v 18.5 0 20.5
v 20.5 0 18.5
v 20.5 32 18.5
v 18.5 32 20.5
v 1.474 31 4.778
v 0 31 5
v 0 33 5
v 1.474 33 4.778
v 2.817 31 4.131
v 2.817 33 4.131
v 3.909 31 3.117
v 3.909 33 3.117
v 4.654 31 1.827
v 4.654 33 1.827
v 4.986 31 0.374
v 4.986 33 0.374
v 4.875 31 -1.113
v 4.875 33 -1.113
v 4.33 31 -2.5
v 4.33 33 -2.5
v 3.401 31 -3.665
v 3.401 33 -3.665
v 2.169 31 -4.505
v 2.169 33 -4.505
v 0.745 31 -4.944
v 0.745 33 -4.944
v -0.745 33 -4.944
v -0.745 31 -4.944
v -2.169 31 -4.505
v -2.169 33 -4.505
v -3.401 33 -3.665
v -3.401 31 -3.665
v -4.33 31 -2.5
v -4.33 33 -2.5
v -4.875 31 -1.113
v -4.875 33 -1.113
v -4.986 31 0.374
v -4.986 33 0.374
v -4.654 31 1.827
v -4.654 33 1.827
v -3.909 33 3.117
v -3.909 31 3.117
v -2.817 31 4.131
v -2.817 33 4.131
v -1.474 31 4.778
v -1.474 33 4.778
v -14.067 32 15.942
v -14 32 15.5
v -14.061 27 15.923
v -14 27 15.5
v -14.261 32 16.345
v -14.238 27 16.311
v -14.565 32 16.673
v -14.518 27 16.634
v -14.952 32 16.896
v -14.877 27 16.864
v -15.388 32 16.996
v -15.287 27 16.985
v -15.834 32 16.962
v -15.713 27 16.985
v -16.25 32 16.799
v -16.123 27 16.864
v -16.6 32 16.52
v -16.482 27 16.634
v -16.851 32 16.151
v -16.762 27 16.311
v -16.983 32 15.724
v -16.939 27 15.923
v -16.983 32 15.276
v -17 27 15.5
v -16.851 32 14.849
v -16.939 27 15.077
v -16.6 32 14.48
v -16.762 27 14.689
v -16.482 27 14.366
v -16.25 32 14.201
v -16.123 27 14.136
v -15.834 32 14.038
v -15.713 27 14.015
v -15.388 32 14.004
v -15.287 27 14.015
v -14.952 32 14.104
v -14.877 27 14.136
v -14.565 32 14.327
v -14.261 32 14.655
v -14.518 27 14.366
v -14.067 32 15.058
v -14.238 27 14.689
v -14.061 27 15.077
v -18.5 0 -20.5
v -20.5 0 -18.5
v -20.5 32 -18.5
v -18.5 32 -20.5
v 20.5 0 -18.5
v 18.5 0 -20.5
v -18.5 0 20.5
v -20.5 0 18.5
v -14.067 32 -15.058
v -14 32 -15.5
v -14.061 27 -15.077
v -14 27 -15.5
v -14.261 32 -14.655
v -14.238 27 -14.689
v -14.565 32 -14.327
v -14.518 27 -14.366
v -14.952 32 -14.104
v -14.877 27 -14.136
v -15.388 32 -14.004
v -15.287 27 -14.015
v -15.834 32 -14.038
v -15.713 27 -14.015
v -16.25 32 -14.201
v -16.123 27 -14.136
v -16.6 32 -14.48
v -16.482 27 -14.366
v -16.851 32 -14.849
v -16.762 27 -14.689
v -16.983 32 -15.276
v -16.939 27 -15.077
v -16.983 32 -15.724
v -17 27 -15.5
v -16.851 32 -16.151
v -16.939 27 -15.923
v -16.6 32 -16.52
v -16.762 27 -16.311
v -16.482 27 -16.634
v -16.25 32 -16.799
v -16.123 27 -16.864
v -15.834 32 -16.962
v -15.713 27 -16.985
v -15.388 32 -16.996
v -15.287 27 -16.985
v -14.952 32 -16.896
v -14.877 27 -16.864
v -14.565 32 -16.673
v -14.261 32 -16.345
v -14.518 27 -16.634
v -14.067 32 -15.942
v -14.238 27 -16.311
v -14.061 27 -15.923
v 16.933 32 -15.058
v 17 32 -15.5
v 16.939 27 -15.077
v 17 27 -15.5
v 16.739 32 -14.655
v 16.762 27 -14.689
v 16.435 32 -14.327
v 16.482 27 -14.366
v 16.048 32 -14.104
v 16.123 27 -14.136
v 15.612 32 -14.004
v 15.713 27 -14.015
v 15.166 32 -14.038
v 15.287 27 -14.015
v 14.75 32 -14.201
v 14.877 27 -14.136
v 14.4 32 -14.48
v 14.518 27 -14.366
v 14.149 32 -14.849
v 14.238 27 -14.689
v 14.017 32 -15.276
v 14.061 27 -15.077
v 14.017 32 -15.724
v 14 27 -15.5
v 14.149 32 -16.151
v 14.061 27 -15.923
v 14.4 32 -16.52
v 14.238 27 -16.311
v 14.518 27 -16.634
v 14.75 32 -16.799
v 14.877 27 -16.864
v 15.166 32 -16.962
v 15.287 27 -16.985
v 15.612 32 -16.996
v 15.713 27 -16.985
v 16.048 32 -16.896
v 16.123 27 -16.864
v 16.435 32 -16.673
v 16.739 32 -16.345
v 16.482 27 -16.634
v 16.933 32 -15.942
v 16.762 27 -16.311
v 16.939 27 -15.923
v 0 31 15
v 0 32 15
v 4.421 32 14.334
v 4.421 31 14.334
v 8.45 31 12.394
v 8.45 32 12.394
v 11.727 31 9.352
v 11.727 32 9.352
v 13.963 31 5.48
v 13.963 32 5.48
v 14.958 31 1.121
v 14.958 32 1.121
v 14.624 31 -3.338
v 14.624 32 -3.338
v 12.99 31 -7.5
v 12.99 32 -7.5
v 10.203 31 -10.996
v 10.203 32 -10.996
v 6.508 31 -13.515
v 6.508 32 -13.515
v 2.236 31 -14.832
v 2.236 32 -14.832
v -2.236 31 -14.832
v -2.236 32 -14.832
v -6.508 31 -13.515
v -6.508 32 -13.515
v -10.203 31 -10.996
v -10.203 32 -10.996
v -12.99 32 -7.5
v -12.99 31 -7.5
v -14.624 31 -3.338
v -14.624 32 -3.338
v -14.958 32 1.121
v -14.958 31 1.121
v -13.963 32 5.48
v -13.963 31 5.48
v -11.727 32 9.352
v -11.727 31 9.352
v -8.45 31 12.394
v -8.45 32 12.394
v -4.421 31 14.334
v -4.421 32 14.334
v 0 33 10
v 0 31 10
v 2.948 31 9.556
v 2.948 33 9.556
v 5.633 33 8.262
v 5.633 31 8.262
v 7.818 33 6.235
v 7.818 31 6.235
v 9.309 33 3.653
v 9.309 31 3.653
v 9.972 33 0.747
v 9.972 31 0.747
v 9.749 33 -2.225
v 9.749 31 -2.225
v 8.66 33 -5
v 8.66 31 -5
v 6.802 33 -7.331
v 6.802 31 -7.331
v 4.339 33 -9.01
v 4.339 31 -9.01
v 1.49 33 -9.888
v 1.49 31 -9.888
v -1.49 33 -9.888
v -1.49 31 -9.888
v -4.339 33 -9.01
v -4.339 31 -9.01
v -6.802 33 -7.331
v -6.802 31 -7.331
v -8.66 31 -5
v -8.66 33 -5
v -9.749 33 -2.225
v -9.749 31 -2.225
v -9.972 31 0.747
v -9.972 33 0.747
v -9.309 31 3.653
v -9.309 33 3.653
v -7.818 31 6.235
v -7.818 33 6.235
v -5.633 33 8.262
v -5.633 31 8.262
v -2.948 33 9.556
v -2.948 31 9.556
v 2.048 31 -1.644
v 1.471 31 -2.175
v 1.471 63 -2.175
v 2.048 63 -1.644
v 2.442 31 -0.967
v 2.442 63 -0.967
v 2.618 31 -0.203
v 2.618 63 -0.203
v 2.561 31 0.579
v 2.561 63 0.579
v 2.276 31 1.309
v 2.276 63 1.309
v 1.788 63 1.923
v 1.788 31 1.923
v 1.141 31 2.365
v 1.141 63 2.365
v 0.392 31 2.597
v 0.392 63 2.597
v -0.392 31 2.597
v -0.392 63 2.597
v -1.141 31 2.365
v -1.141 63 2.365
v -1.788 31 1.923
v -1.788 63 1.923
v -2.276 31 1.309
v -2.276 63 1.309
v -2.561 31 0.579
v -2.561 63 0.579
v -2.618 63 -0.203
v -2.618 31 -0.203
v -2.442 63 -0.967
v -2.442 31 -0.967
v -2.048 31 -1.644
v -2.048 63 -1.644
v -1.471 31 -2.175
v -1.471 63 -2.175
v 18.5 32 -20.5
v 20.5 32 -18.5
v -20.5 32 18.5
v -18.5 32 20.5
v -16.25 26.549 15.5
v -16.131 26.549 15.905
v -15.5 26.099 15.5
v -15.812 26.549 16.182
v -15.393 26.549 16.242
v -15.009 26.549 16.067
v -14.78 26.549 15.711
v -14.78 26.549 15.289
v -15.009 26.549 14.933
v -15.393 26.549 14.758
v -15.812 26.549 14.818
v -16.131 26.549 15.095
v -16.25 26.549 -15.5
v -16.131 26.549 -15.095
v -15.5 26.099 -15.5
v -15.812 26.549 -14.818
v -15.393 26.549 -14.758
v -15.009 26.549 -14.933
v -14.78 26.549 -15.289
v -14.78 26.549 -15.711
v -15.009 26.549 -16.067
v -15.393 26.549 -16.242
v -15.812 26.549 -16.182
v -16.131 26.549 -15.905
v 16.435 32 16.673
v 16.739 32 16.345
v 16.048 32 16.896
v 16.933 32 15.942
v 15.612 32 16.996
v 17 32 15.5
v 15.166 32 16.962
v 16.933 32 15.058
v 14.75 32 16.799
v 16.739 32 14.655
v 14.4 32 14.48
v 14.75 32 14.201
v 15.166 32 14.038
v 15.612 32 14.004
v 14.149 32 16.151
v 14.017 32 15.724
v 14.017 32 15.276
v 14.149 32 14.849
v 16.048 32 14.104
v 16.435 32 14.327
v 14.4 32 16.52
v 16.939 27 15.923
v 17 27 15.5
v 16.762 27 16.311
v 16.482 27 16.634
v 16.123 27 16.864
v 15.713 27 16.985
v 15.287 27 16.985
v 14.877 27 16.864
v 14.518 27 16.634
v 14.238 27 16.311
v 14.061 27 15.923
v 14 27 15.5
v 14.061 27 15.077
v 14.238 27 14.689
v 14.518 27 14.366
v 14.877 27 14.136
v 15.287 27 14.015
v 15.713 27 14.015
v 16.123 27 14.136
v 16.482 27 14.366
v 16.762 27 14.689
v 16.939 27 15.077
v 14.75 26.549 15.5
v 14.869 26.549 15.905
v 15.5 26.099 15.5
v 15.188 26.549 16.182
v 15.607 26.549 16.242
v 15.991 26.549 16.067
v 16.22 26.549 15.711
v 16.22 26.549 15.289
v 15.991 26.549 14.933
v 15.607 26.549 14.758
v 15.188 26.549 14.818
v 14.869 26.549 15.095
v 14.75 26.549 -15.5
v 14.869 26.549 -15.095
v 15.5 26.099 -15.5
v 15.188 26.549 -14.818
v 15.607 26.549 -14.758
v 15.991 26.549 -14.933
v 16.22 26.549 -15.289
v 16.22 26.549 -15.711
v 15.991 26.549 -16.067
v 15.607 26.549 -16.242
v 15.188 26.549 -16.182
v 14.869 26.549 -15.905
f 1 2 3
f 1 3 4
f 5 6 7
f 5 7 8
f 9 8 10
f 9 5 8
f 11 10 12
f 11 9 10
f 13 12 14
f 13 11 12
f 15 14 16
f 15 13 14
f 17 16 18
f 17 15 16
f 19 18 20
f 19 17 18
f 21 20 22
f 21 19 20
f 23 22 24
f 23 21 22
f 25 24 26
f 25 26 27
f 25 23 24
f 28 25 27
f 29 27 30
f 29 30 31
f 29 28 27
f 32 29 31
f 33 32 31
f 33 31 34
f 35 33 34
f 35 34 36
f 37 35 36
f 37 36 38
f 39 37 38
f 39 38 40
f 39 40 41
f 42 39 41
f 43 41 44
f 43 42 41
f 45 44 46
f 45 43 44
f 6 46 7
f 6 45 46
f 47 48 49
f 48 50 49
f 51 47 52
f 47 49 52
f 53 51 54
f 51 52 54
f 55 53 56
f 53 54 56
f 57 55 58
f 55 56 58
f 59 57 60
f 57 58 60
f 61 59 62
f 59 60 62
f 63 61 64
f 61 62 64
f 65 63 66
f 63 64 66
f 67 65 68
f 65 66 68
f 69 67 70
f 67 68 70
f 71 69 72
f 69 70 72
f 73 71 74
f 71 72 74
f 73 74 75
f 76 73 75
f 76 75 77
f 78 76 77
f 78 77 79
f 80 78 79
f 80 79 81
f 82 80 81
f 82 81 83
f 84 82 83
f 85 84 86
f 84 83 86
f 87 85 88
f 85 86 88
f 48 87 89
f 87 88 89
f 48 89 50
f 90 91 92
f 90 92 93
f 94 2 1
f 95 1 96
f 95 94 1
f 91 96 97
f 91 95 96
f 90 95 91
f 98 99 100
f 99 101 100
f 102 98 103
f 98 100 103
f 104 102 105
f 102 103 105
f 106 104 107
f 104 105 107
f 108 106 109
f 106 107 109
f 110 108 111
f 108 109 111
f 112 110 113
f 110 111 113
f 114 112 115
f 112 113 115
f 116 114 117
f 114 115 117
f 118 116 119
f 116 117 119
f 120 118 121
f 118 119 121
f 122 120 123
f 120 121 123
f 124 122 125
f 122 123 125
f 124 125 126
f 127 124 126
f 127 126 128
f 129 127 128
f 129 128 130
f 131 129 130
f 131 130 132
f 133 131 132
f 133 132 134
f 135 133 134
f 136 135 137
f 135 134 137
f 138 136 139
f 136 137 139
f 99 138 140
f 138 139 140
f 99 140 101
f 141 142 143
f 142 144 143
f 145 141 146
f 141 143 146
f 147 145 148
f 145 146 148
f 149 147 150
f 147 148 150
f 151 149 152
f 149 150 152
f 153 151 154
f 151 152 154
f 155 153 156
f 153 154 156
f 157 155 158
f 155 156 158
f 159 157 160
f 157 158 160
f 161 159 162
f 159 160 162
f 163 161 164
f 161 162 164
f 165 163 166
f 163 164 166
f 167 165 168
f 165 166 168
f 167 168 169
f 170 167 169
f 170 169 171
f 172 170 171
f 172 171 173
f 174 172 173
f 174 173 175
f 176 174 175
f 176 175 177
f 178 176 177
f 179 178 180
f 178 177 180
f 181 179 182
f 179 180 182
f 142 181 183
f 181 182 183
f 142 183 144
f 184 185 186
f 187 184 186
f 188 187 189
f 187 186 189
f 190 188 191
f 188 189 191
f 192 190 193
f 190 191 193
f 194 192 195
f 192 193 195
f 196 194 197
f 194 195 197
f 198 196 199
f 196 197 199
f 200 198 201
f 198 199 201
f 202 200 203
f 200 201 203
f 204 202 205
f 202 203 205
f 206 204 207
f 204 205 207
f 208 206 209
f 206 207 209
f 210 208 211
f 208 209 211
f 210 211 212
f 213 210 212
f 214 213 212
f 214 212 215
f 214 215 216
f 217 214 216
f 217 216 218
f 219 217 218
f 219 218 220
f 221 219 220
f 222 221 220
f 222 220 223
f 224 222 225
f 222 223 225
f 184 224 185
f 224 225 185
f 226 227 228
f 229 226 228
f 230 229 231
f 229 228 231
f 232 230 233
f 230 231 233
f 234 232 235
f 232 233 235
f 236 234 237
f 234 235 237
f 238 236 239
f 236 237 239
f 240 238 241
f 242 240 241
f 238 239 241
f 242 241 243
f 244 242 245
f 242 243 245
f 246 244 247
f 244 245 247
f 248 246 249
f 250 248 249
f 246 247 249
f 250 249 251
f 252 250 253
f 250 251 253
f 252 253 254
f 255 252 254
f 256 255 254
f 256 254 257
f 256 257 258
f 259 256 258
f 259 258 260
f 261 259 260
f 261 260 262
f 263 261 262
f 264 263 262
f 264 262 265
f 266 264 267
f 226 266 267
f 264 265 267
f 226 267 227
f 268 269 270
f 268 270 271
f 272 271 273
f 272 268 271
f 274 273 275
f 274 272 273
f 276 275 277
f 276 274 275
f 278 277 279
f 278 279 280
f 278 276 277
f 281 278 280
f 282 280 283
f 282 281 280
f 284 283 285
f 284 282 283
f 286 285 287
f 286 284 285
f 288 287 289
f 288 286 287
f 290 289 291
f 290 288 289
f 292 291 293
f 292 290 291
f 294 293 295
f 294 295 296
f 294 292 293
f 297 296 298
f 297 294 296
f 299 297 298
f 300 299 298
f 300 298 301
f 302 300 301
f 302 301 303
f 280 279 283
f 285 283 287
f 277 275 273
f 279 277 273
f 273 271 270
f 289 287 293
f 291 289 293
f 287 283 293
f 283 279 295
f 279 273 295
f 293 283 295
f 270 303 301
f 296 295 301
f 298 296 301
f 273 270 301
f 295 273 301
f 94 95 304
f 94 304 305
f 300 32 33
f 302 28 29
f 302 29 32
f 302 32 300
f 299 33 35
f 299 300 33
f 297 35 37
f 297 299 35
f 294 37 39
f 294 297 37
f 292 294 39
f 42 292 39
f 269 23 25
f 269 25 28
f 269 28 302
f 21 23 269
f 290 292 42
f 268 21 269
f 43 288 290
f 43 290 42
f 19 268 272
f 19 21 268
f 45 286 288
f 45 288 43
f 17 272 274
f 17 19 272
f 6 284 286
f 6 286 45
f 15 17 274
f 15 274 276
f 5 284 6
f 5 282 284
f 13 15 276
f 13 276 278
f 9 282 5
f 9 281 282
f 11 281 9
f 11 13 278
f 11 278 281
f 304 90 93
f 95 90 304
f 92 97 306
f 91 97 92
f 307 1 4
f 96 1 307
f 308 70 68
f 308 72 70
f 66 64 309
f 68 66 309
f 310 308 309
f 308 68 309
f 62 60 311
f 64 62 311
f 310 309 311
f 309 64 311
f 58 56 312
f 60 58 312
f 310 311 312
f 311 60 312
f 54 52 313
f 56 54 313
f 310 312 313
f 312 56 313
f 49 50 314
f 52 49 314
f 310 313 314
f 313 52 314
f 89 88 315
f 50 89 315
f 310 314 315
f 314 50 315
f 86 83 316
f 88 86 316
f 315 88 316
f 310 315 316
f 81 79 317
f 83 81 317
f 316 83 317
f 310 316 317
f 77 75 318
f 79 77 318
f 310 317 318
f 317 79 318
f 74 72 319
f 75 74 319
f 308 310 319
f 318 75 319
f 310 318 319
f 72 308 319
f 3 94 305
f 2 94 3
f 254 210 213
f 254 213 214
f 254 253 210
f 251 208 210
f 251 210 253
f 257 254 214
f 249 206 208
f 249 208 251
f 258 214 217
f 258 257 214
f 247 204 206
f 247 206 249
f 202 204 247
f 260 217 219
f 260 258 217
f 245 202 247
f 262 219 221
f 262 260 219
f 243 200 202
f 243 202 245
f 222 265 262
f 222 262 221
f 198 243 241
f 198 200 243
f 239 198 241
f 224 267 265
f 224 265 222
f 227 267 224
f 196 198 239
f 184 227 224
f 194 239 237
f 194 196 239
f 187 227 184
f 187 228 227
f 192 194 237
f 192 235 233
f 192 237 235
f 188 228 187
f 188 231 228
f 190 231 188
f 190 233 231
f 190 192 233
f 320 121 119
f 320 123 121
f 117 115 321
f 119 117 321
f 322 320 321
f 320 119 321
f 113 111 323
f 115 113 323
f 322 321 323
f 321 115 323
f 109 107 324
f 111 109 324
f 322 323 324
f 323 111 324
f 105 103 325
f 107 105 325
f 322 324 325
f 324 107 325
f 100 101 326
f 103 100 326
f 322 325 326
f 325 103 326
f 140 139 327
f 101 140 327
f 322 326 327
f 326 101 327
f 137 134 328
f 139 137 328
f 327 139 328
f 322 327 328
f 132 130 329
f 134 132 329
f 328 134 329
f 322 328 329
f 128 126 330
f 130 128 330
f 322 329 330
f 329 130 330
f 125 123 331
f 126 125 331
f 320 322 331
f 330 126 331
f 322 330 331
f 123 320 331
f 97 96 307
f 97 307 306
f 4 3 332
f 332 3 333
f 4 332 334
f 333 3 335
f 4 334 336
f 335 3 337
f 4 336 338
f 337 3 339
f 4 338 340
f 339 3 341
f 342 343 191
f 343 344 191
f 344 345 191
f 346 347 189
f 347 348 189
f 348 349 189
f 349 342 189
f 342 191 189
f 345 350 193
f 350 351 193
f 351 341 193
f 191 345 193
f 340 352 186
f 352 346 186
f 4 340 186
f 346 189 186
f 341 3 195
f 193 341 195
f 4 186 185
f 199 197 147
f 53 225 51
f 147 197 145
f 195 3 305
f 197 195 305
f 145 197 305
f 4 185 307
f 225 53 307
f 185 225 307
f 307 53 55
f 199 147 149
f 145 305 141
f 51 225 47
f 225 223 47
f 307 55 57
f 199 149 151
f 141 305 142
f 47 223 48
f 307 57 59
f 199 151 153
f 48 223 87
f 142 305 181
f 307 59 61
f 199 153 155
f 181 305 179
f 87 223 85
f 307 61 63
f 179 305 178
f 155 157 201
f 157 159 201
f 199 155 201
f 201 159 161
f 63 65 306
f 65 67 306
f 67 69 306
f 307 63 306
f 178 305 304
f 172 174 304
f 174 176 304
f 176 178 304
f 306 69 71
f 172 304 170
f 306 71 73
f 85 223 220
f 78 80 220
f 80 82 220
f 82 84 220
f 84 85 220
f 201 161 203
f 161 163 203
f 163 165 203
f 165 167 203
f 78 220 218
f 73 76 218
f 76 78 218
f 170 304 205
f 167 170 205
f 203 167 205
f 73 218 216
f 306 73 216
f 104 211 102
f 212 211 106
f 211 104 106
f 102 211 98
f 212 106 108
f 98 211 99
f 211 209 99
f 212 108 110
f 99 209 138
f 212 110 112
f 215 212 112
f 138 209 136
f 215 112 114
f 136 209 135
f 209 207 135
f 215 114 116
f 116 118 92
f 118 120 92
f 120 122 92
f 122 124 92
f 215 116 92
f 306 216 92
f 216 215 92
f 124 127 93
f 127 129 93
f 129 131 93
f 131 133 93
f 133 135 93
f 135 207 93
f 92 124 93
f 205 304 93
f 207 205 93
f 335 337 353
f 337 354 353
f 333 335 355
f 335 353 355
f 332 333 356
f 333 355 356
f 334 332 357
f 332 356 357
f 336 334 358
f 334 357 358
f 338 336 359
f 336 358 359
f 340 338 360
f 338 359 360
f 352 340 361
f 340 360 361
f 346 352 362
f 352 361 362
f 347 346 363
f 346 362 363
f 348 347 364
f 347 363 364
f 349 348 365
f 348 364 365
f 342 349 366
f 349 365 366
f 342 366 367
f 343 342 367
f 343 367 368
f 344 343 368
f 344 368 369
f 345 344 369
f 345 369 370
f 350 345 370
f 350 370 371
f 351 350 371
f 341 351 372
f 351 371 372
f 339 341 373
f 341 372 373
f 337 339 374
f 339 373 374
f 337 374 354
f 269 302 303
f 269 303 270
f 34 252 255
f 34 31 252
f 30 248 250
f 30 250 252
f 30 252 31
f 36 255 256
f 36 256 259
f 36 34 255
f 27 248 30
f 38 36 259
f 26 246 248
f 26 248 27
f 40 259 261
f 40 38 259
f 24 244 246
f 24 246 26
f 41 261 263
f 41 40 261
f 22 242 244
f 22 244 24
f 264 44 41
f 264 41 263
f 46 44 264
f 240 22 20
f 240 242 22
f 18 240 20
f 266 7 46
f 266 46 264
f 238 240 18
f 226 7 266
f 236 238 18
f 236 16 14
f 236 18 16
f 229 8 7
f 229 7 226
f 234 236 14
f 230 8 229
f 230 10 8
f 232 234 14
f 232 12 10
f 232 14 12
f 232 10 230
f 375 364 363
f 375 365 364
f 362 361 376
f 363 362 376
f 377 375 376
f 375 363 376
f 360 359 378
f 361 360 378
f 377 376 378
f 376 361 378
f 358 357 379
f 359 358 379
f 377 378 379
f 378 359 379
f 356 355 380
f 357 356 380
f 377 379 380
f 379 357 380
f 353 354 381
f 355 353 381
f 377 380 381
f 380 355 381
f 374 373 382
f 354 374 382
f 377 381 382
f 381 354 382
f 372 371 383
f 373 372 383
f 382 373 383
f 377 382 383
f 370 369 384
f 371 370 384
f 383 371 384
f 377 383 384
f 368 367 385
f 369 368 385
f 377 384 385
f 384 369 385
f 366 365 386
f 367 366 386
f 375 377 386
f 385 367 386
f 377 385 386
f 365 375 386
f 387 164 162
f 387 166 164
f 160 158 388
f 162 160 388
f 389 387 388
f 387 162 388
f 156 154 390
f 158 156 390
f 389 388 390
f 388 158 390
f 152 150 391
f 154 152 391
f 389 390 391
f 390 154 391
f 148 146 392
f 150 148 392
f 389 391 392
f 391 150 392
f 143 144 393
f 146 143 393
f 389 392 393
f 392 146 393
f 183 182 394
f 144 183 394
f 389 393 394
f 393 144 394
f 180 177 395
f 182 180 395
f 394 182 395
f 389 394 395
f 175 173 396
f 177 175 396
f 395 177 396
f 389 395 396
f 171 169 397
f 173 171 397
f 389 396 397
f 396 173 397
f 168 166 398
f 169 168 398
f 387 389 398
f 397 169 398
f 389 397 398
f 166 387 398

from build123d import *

# Parameters (mm, degrees)
BOSS_EXTRUDE1_DEPTH          = 32
SKETCH2_R                    = 15
CUT_EXTRUDE1_DEPTH           = 1
SKETCH3_R                    = 10
SKETCH3_R_2                  = 5
BOSS_EXTRUDE2_DEPTH          = 2
BOSS_EXTRUDE3_DEPTH          = 32
F_3_0_3_DIAMETER_HOLE1_D     = 3
F_3_0_3_DIAMETER_HOLE1_DEPTH = 5
F_3_0_3_DIAMETER_HOLE1_TIP   = 0.901290929


with BuildPart() as part:
    # Sketch1 → Boss-Extrude1 (new body)
    with BuildSketch(Plane(origin=(0, 0, 0), x_dir=(1, 0, 0), z_dir=(0, 1, 0))):
        Polygon((-20.5, 18.5), (-18.5, 20.5), (18.5, 20.5), (20.5, 18.5), (20.5, -18.5), (18.5, -20.5), (-18.5, -20.5), (-20.5, -18.5), align=None)
    extrude(amount=BOSS_EXTRUDE1_DEPTH)

    # Sketch2 → Cut-Extrude1 (cut)
    with BuildSketch(Plane(origin=(0, 32, 0), x_dir=(-1, 0, 0), z_dir=(0, 1, 0))):
        Circle(SKETCH2_R)
    extrude(amount=-CUT_EXTRUDE1_DEPTH, mode=Mode.SUBTRACT)

    # Sketch3 → Boss-Extrude2 (add)
    with BuildSketch(Plane(origin=(0, 31, 0), x_dir=(1, 0, 0), z_dir=(0, 1, 0))):
        Circle(SKETCH3_R)
        Circle(SKETCH3_R_2, mode=Mode.SUBTRACT)
    extrude(amount=BOSS_EXTRUDE2_DEPTH)

    # Sketch4 → Boss-Extrude3 (add)
    with BuildSketch(Plane(origin=(0, 31, 0), x_dir=(1, 0, 0), z_dir=(0, 1, 0))):
        with BuildLine():
            Line((-1.470984161, 2.175359116), (1.470984161, 2.175359116))
            ThreePointArc((1.470984161, 2.175359116), (0, -2.626020123), (-1.470984161, 2.175359116))
        make_face()
    extrude(amount=BOSS_EXTRUDE3_DEPTH)

    # Ø3.0 (3) Diameter Hole1
    with Locations(Plane(origin=(0, 32, 0), x_dir=(-1, 0, 0), z_dir=(0, 1, 0))):
        with Locations((-15.5, -15.5), (15.5, -15.5), (15.5, 15.5), (-15.5, 15.5)):
            Hole(F_3_0_3_DIAMETER_HOLE1_D / 2, depth=F_3_0_3_DIAMETER_HOLE1_DEPTH)
            with Locations((0, 0, -(F_3_0_3_DIAMETER_HOLE1_DEPTH + F_3_0_3_DIAMETER_HOLE1_TIP / 2))):  # 118° drill point
                Cone(0, F_3_0_3_DIAMETER_HOLE1_D / 2, F_3_0_3_DIAMETER_HOLE1_TIP, mode=Mode.SUBTRACT)


solid = part.part
